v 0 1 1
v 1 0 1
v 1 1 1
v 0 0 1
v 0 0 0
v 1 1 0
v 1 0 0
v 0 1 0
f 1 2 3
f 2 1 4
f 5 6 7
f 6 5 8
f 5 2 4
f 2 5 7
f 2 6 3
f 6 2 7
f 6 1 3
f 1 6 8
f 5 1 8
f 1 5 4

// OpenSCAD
module example2_scad () {
  echo("REC", "abcd", "efgh");
  echo("REC", "a.b.c.d", 23);
  cube(size = 1);
}
example2_scad();
